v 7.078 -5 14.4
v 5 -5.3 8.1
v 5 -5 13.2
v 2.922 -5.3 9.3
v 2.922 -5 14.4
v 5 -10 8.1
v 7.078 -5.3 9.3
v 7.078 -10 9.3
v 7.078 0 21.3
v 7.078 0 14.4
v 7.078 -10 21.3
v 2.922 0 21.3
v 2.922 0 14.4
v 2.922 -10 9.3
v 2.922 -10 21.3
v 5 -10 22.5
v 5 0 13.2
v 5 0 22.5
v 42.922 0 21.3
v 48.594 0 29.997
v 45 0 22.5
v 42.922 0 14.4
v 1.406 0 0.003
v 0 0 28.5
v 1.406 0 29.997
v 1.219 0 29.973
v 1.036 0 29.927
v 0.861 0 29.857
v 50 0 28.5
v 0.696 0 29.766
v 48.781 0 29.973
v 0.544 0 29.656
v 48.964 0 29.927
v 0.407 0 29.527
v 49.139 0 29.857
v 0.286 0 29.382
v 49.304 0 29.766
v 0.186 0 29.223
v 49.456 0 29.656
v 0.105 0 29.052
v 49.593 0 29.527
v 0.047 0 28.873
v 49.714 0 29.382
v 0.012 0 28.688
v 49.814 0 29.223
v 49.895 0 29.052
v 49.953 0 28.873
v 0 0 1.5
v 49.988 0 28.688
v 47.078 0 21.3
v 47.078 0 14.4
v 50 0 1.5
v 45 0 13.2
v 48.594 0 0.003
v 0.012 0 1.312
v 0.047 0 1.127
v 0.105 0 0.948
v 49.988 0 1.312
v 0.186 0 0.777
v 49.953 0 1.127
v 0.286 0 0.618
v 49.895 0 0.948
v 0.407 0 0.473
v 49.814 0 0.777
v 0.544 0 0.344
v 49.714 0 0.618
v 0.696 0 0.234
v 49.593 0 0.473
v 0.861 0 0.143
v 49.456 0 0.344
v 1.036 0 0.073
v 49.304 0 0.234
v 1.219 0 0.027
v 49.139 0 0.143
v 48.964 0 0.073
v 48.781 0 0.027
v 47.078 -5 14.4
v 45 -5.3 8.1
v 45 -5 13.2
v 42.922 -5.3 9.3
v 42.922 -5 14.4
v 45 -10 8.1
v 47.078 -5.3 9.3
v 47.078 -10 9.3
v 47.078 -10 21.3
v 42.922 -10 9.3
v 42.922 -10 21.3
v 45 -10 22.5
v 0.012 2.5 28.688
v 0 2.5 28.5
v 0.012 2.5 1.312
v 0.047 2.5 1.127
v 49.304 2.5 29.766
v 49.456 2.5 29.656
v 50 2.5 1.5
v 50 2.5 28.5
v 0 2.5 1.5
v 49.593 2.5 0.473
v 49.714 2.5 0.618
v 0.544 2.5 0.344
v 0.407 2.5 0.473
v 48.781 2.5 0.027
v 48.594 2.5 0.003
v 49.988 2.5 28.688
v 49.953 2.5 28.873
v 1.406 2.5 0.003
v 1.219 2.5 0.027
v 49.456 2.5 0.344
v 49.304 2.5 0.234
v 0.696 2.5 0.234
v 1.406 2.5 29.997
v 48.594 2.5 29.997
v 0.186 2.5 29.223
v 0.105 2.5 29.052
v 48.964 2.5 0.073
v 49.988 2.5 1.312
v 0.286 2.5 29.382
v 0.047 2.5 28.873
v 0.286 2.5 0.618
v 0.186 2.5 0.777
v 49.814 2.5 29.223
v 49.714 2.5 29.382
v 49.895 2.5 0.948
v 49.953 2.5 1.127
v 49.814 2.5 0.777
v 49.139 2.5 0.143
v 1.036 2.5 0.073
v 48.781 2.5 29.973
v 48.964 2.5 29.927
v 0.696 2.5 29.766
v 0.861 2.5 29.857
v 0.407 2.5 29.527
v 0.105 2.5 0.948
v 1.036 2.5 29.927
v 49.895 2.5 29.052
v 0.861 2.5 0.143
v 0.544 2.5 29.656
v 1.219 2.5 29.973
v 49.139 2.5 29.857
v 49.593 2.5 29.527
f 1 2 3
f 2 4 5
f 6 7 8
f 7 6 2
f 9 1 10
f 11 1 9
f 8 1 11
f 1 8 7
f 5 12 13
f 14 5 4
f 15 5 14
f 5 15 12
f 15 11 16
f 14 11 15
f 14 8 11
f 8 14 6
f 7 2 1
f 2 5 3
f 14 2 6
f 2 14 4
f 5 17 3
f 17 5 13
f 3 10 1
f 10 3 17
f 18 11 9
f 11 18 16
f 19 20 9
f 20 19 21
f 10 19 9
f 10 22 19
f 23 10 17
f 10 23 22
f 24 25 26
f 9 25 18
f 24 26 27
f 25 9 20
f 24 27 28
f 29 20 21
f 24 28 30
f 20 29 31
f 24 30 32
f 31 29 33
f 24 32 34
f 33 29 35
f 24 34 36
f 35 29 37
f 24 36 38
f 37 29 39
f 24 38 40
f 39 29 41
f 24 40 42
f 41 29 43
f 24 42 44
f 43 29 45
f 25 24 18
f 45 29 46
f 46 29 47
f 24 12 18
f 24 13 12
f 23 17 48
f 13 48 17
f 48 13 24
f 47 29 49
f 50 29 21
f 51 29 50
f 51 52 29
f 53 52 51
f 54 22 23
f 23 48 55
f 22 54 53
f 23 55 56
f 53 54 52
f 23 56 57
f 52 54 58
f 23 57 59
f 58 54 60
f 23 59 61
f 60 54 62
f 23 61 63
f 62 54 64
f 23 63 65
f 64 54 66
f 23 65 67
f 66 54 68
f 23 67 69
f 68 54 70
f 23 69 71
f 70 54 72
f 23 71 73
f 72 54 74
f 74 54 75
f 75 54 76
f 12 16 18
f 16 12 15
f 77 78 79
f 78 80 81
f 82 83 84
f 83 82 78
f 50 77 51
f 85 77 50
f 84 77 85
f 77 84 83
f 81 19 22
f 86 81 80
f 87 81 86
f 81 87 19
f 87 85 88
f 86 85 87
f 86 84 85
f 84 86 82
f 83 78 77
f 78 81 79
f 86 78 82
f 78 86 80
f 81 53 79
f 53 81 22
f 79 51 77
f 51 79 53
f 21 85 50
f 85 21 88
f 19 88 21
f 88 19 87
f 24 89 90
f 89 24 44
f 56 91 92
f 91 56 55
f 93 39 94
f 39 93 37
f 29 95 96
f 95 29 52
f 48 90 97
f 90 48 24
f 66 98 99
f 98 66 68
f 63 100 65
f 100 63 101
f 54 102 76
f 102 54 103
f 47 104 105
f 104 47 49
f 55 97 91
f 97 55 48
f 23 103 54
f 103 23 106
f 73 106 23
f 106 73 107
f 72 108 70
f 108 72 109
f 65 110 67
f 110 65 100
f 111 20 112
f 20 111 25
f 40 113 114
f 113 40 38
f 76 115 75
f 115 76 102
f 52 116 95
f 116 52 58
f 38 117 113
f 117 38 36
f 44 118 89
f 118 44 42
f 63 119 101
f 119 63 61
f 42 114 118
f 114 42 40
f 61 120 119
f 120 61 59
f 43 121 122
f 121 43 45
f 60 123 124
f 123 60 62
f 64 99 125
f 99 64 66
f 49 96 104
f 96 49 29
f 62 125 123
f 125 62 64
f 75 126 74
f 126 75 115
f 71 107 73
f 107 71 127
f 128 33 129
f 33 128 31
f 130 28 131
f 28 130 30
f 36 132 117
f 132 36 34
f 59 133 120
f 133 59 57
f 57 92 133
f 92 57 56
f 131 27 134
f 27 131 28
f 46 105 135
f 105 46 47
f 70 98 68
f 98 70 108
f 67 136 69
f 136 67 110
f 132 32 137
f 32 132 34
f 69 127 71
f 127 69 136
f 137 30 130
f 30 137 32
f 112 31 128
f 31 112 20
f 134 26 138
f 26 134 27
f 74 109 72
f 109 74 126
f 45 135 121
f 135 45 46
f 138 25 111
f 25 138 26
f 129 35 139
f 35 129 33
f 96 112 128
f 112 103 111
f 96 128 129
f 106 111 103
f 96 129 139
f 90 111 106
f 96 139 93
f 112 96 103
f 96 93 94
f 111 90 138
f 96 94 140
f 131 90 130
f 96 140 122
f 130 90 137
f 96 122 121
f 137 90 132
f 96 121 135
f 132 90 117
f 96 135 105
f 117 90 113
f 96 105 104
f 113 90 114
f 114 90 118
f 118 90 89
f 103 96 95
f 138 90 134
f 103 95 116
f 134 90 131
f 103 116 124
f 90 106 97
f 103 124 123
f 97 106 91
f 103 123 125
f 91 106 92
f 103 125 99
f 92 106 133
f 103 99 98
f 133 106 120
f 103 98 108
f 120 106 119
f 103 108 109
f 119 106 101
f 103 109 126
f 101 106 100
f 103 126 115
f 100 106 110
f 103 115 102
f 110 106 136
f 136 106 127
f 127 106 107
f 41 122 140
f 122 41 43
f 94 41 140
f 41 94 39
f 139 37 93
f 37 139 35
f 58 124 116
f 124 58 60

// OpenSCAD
// SKADIS Label

Width = 50;
Height = 30;
Thickness = 2.5;
Radius = 1.5;
HookFromTop = 7.5;
$fn = 50;

assert(Radius < Width/2);
assert(Radius < Height/2);

// Plate
if (Radius < 0.1) {
  cube([Width, Thickness, Height]);
} else {
  translate([0,Thickness,0]) rotate([90,0,0]) hull() {
    translate([Radius, Radius, 0]) cylinder(r=Radius, h=Thickness);
    translate([Width-Radius, Radius, 0]) cylinder(r=Radius, h=Thickness);
    translate([Width-Radius, Height-Radius, 0]) cylinder(r=Radius, h=Thickness);
    translate([Radius, Height-Radius, 0]) cylinder(r=Radius, h=Thickness);
  }
}

// Hook(s)
// Assume they only need one or 2 hooks
z = Height - HookFromTop;
if (Width < 50) { // 1 hook
  translate([Width/2, 0, z]) hook();
} else { // 2 Hooks
  x = (Width - 40) / 2;
  translate([x, 0, z]) hook();
  translate([x + 40, 0, z]) hook();
}

module hook() {
  // t is the amount we reduce the width/height by to let it fit ok
  t = 0.1;
  // w = width
  w = 5;
  // wt is the width less the t
  wt = w - t * 2;
  // h is the hight less a bit to make it fit
  h = 15 - 0.3;
  // h2 is the height of the smaller part of the peg
  h2 = h - 5;
  // ht is the height less t
  ht = h - t;
  // d is the depth of the board
  d = 5;
  // 6 gives us enough facets to create a easy to print angle
  $fn = 6;

  translate([0, -d*2, -wt/2]) rotate([270, 90,0]) union() {
    // The larger part of the peg
    hull() {
      //cylinder(d=wt, h=d+0.3);
      // -0.1 is the taper applied to the face that makes contact with the back on the pegboard
      translate([h2 - w - t * 2, 0, 0]) cylinder(d=wt, h=d+0.0);
      // -0.3 is the taper applied to the face that makes putting the hook on easier
      translate([ht-w, 0, 0]) cylinder(d=wt, h=d-0.3);
    }
    // The smaller part of the peg
    translate([0, 0, 0]) hull() {
      cylinder(d=wt, h = d * 2);
      translate([h2 - w - t * 2 ,0 ,0]) cylinder(d=wt, h=d * 2);
      };
  }
}
